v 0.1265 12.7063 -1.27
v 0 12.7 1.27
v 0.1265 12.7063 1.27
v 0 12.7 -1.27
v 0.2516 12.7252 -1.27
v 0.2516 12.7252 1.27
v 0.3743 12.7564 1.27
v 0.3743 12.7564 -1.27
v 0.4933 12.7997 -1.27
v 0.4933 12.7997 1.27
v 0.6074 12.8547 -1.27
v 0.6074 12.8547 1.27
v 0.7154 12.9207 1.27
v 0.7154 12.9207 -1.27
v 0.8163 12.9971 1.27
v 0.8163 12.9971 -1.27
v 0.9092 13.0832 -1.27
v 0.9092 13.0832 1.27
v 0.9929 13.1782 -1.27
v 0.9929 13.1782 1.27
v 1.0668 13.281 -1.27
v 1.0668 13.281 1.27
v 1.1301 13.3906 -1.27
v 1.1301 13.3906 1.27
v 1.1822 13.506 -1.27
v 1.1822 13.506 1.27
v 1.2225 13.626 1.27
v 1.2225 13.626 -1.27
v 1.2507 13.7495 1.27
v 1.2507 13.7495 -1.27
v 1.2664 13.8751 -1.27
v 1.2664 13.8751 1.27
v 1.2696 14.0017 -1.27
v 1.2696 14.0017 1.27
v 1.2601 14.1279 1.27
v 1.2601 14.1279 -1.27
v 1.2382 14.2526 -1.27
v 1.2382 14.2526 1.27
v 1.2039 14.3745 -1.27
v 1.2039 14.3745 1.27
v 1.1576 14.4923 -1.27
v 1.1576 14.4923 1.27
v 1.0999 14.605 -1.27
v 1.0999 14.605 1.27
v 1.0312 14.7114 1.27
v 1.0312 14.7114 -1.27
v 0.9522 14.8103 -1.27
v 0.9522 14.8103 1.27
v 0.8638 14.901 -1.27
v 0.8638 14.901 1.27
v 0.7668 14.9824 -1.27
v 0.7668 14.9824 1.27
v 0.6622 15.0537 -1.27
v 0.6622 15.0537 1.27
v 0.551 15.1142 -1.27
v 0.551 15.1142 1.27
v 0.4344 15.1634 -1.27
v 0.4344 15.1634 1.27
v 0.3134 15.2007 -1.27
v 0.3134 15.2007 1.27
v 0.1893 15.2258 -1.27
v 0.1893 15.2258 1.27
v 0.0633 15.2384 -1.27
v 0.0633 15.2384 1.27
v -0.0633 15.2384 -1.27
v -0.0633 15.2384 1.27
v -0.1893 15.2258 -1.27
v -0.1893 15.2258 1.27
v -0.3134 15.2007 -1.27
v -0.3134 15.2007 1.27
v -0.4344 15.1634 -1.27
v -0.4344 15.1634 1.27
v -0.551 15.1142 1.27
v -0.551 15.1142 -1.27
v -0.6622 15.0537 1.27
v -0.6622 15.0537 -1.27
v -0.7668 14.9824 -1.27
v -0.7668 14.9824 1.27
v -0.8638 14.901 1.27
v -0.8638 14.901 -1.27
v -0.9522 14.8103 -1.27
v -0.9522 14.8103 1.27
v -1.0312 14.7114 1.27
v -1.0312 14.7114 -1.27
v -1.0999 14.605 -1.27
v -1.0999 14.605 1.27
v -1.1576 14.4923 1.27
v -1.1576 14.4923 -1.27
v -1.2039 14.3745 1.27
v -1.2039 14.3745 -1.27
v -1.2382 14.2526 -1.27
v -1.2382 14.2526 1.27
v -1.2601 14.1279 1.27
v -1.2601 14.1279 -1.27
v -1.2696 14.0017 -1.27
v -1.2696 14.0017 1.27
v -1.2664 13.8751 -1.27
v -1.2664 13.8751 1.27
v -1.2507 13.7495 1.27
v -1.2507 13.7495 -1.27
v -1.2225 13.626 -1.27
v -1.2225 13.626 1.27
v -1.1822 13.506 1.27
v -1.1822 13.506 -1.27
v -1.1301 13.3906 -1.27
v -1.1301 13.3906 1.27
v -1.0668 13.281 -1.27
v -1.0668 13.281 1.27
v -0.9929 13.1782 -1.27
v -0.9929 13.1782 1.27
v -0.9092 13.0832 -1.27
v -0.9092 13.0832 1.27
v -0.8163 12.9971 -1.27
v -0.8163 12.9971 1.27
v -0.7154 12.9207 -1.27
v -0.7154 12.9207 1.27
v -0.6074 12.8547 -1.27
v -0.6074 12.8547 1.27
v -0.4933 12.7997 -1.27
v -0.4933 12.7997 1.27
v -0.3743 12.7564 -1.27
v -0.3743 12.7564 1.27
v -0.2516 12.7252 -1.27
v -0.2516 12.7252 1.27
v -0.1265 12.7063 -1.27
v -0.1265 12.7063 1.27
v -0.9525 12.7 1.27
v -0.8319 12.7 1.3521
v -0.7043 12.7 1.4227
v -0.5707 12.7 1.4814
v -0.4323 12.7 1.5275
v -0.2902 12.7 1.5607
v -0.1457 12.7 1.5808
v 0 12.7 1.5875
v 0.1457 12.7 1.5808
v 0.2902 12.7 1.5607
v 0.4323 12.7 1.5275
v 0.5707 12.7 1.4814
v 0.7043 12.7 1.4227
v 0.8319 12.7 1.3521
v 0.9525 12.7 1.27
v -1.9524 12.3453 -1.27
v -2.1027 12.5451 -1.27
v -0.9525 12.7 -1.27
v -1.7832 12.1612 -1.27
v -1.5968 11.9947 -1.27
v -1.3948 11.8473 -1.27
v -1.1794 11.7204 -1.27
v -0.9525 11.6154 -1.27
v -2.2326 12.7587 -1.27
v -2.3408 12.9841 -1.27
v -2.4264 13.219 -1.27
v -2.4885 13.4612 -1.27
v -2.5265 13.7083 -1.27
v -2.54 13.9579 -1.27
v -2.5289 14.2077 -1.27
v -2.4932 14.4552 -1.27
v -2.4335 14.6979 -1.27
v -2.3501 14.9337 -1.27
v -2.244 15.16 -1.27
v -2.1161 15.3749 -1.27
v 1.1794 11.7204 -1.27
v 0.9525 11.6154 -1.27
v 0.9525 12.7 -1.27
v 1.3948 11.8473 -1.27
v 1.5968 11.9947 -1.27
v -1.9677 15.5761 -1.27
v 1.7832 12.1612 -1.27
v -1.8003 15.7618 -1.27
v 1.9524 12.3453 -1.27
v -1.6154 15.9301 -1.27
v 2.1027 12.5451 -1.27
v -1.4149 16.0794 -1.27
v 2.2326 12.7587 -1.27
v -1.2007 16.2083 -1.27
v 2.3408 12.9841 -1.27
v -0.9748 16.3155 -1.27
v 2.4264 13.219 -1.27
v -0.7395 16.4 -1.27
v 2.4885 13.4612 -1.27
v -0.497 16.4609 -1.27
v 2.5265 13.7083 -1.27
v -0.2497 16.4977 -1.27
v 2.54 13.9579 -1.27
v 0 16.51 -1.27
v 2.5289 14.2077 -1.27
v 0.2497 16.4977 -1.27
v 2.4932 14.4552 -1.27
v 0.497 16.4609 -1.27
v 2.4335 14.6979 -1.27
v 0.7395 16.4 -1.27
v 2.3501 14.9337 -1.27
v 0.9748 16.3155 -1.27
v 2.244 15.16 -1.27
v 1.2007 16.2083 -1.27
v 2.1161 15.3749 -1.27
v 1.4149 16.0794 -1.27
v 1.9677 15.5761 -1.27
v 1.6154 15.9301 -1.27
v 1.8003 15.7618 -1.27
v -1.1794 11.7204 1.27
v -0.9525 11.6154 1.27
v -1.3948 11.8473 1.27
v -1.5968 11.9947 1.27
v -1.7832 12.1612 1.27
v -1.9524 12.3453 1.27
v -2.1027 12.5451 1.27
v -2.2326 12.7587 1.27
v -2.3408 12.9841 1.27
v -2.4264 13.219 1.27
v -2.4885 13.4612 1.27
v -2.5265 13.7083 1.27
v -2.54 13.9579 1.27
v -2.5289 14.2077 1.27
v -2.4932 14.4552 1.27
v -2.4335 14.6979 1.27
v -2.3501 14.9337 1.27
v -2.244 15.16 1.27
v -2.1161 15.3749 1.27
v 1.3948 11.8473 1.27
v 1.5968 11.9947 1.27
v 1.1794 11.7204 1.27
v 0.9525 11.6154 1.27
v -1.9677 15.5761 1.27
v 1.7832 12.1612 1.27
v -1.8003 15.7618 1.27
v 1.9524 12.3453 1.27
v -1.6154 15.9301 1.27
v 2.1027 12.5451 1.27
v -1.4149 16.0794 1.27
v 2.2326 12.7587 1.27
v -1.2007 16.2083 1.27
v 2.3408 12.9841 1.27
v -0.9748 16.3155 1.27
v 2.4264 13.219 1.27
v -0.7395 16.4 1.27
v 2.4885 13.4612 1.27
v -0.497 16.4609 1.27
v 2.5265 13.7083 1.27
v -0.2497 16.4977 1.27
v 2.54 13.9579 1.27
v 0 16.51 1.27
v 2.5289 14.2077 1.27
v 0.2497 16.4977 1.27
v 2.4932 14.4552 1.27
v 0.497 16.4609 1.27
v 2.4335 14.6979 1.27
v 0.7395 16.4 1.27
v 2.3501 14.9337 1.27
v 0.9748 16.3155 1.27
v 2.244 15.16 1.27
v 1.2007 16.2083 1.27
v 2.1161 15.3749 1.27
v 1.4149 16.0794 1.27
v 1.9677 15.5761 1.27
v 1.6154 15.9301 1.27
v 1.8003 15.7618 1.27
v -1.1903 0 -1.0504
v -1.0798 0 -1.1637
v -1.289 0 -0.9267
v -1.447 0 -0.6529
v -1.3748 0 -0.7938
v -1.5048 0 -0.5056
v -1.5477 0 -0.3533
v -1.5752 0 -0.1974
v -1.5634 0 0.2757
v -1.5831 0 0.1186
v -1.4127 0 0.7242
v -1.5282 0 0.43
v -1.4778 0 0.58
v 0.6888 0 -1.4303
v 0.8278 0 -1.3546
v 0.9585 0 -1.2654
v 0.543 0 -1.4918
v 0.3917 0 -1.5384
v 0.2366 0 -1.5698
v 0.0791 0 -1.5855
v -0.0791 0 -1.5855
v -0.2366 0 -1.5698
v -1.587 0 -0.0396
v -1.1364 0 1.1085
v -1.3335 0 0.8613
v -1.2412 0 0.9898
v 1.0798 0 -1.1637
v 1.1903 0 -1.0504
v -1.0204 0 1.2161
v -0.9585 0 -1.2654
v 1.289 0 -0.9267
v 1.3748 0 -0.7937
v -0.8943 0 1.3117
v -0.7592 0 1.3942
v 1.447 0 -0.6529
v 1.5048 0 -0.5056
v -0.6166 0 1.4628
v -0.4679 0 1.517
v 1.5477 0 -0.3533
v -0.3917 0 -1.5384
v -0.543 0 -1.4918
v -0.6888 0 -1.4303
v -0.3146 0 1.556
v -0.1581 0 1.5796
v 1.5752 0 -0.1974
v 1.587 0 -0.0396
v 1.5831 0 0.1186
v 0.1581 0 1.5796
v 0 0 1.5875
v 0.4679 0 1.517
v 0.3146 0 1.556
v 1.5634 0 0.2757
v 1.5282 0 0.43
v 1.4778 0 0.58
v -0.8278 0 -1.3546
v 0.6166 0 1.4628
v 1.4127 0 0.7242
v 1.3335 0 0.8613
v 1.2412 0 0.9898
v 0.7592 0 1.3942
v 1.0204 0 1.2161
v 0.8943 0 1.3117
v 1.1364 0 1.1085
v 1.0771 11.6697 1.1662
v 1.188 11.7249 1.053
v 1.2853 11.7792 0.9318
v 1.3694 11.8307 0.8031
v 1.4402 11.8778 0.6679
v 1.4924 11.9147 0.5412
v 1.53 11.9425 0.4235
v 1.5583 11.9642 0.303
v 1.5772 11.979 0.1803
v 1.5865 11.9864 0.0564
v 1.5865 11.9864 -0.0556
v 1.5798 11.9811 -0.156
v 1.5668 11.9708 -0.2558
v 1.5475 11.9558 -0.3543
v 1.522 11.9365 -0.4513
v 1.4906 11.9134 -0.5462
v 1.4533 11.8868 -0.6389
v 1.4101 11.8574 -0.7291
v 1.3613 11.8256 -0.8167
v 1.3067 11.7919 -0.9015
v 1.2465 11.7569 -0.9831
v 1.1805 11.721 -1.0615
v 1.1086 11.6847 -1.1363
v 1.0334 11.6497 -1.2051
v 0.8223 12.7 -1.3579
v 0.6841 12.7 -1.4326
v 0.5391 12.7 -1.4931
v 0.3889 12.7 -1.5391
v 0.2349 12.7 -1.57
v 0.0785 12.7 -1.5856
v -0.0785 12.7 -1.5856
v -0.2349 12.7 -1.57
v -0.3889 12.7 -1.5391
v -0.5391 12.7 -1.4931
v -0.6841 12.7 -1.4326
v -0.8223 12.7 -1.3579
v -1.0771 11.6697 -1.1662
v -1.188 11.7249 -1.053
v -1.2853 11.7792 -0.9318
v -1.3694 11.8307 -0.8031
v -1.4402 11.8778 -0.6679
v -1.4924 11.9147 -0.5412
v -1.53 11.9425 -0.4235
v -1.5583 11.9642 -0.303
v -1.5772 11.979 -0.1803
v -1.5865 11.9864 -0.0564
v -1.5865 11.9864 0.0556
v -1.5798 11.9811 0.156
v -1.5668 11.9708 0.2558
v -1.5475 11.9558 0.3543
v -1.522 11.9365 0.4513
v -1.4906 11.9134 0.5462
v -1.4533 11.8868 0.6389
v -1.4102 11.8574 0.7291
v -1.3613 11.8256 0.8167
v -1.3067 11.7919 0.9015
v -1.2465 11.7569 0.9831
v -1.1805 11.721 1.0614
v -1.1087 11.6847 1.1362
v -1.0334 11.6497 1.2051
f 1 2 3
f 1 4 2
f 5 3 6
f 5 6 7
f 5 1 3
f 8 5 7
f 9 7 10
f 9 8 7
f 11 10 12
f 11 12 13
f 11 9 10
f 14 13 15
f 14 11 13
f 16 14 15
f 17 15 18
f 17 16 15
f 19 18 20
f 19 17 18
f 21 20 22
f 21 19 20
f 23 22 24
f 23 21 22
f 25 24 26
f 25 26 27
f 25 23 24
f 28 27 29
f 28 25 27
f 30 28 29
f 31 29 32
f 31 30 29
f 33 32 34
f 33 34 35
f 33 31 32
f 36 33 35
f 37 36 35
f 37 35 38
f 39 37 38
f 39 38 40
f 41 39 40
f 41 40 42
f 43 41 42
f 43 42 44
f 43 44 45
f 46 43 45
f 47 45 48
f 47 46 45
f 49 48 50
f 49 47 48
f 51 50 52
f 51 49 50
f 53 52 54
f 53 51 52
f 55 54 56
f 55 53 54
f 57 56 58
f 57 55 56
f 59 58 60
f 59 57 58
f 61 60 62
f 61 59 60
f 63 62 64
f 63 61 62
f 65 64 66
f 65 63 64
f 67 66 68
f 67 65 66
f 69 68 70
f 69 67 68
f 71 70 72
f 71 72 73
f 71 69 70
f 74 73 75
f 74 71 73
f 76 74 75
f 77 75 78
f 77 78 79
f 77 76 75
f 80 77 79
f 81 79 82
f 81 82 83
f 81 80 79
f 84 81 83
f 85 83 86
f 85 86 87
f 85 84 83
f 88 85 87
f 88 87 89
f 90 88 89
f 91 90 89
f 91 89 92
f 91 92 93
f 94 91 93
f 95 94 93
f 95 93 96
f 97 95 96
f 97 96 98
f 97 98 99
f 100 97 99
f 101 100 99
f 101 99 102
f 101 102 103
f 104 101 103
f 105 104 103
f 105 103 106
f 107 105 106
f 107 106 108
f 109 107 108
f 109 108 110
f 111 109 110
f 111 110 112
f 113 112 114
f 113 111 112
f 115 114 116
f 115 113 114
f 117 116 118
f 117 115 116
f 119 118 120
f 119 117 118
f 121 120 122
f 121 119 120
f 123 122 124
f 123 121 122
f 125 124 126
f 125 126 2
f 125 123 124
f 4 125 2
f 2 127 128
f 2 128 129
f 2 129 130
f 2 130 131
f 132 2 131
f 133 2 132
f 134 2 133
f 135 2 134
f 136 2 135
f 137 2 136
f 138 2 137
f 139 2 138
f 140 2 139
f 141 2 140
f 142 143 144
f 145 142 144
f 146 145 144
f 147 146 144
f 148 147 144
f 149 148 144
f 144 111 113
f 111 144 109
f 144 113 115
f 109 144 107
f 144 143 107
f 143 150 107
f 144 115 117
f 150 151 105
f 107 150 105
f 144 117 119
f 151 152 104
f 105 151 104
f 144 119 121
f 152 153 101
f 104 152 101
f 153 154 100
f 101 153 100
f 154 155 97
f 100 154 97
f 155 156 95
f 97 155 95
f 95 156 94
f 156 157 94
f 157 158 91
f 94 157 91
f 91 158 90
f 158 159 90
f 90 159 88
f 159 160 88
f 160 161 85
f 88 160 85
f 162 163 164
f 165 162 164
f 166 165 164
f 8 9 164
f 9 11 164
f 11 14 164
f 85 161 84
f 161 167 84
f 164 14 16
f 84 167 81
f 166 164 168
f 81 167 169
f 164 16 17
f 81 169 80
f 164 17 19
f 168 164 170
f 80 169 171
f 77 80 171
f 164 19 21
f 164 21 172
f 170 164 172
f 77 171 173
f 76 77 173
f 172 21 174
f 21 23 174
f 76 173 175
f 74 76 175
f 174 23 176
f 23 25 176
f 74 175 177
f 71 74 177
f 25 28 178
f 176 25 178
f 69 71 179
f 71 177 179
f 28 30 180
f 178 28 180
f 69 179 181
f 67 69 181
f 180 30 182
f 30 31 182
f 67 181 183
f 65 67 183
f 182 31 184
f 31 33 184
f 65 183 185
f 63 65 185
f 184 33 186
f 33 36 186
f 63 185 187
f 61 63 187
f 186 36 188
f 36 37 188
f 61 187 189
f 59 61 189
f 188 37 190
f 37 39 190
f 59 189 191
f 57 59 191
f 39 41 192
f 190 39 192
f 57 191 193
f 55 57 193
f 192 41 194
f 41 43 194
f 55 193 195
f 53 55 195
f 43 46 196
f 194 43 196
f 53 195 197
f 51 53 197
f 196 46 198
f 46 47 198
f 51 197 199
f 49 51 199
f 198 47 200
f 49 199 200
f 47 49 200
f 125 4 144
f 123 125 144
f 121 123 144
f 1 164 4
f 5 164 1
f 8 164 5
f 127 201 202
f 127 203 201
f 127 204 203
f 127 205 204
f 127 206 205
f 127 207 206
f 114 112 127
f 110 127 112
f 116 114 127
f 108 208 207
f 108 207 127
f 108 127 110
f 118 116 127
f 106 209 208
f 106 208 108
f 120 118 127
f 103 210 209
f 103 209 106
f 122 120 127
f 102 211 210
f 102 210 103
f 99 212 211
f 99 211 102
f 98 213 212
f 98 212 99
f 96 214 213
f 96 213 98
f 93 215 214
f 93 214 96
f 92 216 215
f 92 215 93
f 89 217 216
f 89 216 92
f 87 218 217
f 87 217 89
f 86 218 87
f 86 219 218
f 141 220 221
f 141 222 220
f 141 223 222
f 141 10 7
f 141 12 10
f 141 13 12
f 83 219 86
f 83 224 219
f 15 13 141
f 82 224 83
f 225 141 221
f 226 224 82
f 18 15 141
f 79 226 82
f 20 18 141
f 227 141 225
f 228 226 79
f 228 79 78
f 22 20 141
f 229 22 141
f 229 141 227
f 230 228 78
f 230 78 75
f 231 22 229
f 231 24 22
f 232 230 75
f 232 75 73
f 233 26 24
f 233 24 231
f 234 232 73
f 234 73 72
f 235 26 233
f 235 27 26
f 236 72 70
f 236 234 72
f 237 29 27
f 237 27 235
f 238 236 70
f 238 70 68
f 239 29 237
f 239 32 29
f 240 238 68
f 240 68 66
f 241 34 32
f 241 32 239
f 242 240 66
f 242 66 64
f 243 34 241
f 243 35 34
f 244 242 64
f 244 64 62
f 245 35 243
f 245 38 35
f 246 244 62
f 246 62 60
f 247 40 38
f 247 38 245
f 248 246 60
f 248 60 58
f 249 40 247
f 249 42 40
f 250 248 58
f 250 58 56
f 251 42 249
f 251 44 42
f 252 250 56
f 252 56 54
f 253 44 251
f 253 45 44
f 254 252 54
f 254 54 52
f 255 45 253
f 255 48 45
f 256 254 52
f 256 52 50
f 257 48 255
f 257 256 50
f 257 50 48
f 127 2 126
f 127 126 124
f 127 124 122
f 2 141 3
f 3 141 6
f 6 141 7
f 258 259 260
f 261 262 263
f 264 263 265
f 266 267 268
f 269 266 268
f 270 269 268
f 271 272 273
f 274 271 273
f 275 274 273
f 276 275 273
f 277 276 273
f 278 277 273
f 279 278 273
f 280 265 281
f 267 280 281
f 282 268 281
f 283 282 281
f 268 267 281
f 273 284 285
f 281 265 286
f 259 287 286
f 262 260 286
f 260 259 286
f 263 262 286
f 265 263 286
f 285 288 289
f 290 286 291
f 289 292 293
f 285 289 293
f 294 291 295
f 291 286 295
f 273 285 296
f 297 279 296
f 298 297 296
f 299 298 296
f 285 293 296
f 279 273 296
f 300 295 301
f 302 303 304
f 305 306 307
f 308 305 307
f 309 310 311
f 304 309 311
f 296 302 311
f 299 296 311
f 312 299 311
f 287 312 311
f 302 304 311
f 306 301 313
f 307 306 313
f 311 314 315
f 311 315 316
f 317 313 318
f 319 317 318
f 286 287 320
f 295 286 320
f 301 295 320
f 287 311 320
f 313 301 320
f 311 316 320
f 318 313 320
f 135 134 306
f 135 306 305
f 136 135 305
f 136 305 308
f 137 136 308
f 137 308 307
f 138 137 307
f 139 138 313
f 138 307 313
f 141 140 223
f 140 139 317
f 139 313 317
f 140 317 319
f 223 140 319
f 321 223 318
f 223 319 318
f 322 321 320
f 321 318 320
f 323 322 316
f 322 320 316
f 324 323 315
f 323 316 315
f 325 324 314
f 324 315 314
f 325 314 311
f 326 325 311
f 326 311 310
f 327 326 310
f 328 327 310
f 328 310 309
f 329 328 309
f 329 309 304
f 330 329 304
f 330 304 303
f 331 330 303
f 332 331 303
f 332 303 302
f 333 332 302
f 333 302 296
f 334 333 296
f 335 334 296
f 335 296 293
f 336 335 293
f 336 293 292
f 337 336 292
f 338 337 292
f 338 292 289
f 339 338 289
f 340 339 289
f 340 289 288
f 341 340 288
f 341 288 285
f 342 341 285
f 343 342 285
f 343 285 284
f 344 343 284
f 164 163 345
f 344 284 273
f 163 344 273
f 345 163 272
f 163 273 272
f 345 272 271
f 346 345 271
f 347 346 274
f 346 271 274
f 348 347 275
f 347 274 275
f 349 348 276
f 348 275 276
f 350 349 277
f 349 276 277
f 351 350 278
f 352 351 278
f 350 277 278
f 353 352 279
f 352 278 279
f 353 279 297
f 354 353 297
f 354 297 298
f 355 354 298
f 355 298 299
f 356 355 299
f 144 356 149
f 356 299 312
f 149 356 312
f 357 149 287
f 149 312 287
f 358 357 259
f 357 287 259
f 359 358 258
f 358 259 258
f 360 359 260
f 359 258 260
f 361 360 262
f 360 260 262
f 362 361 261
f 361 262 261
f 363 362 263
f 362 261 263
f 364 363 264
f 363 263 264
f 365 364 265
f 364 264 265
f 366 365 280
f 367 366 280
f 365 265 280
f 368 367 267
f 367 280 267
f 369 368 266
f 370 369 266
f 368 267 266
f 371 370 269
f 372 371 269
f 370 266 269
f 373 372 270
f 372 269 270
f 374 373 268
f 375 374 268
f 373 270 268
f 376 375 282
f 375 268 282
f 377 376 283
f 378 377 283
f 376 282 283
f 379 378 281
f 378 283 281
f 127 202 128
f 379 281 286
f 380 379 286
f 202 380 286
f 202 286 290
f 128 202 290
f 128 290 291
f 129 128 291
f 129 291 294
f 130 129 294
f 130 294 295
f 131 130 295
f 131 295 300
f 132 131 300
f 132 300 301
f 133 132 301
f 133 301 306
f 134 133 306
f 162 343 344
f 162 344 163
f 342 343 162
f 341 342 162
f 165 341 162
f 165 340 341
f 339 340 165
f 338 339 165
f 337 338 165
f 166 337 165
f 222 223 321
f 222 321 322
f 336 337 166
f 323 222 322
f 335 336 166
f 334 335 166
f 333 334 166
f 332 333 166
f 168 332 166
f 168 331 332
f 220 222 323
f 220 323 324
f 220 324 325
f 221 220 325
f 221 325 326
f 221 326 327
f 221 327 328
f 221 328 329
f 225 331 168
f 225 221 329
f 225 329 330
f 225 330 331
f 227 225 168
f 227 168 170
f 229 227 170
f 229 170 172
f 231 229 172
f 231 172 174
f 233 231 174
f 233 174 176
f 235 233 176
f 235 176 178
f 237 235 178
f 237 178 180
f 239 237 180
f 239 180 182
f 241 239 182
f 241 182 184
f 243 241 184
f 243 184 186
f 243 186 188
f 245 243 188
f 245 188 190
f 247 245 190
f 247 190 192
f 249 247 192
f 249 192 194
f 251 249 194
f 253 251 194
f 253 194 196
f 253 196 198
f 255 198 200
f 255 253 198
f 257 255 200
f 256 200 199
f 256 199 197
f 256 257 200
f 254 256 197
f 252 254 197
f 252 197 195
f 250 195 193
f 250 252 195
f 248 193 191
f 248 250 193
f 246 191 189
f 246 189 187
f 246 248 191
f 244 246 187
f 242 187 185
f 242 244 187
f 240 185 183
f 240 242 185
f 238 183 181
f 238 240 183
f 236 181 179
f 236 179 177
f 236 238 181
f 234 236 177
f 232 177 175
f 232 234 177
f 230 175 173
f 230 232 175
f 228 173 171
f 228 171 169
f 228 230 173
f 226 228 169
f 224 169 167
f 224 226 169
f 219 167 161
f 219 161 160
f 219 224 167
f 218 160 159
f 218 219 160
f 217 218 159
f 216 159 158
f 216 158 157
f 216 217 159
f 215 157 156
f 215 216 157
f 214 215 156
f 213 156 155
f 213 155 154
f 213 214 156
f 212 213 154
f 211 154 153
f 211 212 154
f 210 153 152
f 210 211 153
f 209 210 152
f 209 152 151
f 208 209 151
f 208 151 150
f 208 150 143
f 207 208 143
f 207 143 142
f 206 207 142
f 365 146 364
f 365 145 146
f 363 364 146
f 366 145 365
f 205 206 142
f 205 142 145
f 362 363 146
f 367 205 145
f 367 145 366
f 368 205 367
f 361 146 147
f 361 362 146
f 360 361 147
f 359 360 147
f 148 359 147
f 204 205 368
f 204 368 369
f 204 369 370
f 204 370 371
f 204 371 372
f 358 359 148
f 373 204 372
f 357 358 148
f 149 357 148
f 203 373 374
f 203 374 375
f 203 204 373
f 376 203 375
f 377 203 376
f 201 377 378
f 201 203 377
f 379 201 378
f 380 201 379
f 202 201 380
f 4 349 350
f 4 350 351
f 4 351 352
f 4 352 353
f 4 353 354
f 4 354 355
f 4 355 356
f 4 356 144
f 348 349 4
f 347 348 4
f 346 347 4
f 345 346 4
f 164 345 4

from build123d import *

# Parameters (mm, degrees)
SKETCH1_R      = 1.5875
EXTRUDE1_DEPTH = 12.7
SKETCH2_R      = 2.54
SKETCH2_R_2    = 1.27
EXTRUDE2_DEPTH = 1.27


with BuildPart() as part:
    # Sketch1 → Extrude1 (new body)
    with BuildSketch(Plane(origin=(0, 0, 0), x_dir=(1, 0, 0), z_dir=(0, 1, 0))):
        with Locations(Location((0, 0, 0), (0, 0, 270))):
            Circle(SKETCH1_R)
    extrude(amount=EXTRUDE1_DEPTH)

    # Sketch2 → Extrude2 (add, symmetric)
    with BuildSketch(Plane.XY):
        with Locations((0, 13.97)):
            Circle(SKETCH2_R)
        with Locations(Location((0, 13.97, 0), (0, 0, 270))):
            Circle(SKETCH2_R_2, mode=Mode.SUBTRACT)
    extrude(amount=EXTRUDE2_DEPTH, both=True)


solid = part.part
